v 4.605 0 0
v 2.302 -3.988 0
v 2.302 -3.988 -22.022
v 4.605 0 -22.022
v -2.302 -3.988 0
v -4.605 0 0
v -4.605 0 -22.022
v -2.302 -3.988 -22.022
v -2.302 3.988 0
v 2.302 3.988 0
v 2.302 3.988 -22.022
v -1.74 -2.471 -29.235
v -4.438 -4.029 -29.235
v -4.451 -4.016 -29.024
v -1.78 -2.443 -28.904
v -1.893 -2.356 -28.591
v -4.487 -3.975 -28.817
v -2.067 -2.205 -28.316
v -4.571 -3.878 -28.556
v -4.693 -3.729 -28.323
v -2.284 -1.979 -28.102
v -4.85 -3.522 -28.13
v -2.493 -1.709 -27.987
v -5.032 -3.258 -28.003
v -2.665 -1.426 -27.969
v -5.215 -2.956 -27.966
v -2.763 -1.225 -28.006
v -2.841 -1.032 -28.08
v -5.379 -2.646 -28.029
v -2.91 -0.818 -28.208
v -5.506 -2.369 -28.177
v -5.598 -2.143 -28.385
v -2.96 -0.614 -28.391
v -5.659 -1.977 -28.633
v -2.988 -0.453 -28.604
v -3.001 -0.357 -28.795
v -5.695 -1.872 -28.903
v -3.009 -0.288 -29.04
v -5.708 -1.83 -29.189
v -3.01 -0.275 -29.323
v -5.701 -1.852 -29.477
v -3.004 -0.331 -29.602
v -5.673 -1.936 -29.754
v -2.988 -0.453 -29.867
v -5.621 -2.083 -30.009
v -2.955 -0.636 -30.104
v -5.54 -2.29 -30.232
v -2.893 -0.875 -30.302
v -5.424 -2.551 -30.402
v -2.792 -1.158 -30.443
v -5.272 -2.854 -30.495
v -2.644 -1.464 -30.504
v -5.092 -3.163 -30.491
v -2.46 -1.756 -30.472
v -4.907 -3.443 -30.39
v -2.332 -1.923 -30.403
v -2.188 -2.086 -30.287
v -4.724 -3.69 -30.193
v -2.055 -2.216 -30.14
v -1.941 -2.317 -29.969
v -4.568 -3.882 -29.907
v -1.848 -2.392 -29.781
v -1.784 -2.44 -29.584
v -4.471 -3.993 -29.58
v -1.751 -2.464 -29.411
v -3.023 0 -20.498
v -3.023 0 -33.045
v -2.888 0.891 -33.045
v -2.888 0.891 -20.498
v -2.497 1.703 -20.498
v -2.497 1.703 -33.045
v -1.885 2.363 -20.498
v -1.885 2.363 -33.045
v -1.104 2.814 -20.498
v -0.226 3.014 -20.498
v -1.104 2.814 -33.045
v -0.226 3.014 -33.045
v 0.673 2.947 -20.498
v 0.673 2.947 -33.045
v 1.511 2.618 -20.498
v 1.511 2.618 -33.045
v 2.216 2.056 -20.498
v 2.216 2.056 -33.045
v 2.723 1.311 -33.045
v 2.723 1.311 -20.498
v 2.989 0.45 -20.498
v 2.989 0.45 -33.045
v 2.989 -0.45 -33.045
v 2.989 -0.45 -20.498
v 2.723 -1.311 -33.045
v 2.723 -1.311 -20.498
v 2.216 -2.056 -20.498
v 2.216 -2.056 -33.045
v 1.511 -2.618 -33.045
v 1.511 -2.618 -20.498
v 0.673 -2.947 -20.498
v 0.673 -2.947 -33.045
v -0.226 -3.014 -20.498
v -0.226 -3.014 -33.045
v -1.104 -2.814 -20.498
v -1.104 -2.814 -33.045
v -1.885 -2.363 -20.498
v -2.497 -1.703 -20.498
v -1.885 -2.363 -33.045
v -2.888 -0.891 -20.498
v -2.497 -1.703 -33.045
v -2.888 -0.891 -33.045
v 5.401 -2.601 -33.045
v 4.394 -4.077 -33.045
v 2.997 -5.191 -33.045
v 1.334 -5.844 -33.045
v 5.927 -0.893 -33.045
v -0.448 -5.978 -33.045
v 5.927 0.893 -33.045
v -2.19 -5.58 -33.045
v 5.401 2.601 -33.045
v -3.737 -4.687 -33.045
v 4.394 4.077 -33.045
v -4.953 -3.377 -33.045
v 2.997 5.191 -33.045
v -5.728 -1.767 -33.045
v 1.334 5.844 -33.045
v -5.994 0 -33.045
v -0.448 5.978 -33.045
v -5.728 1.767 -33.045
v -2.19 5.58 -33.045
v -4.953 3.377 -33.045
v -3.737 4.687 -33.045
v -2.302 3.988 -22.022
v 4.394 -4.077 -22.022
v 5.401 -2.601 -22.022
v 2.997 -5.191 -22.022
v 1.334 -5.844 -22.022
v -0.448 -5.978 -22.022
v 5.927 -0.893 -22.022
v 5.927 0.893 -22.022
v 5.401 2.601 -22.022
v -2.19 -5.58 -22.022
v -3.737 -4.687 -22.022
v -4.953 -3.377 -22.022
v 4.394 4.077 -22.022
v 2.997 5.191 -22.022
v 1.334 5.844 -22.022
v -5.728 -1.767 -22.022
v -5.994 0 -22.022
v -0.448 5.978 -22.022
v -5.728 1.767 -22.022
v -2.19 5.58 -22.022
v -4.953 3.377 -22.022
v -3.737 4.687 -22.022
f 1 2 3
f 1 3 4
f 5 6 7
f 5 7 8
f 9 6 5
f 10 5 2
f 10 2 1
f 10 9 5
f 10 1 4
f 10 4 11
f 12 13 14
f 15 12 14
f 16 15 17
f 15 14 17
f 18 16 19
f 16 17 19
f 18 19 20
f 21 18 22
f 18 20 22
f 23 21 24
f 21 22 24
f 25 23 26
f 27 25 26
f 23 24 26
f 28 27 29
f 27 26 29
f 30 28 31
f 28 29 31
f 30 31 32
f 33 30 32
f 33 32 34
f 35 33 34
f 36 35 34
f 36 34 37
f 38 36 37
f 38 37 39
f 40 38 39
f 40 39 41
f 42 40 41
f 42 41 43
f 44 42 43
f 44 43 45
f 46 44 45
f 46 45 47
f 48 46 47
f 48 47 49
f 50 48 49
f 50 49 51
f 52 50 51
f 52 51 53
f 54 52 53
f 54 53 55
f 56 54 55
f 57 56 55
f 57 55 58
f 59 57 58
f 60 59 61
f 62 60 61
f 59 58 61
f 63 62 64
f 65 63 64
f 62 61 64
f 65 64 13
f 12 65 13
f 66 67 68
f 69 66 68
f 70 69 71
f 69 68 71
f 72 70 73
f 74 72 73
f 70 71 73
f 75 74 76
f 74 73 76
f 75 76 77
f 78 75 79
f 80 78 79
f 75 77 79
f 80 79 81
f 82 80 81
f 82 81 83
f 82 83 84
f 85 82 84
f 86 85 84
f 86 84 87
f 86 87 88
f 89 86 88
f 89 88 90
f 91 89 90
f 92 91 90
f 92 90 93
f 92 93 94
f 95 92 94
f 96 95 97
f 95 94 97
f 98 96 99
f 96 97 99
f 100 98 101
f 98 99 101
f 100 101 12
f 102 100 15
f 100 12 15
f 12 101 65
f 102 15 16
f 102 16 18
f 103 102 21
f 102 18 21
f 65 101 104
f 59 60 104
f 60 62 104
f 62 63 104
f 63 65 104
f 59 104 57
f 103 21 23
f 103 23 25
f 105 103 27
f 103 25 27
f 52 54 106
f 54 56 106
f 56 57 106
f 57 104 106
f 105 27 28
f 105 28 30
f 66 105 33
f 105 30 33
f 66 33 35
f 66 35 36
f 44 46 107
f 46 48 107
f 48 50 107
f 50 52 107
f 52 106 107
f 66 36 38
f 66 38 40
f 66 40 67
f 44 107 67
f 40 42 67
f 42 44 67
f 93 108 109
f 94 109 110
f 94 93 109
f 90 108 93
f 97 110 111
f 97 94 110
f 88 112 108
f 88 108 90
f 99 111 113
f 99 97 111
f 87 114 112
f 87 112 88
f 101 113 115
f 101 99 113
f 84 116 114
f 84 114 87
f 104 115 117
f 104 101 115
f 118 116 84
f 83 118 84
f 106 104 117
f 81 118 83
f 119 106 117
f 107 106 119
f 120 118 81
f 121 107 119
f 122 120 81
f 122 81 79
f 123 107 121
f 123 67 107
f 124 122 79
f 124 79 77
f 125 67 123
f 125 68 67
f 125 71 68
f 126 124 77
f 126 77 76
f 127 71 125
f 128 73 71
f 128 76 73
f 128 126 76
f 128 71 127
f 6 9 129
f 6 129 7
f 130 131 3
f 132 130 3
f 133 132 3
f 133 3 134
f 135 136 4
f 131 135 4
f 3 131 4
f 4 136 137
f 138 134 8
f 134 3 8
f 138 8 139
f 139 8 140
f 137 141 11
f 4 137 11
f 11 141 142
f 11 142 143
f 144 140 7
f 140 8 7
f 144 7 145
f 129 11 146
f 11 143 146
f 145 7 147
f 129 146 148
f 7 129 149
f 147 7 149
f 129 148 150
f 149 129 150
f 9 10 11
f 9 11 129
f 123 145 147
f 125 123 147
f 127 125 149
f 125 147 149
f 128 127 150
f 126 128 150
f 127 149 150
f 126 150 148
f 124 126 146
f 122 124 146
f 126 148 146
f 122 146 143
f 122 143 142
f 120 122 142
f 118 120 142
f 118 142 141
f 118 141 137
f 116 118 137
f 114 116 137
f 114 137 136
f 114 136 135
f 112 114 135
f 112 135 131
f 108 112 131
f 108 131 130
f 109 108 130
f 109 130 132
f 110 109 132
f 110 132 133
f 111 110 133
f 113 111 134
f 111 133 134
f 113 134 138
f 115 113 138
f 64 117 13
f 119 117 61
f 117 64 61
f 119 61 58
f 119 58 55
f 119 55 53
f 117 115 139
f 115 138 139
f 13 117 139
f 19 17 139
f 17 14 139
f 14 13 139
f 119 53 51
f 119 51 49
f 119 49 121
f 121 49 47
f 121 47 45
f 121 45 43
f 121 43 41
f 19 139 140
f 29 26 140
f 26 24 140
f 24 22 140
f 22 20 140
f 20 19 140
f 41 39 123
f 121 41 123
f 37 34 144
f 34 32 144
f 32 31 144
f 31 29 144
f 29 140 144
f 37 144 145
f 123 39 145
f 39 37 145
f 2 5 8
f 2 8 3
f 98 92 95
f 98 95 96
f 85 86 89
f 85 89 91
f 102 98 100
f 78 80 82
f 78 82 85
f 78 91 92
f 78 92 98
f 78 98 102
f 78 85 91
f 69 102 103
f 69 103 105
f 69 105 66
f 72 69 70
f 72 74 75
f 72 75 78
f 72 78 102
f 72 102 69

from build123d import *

# Parameters (mm, degrees)
BOSS_EXTRUDE1_DEPTH = 22.0218
SKETCH3_R           = 5.9944
BOSS_EXTRUDE2_DEPTH = 11.0236
SKETCH4_R           = 3.0226
CUT_EXTRUDE1_DEPTH  = 12.5476
SKETCH5_R           = 1.27
CUT_EXTRUDE2_DEPTH  = 6.35


with BuildPart() as part:
    # Sketch1 → Boss-Extrude1 (new body)
    with BuildSketch(Plane.XY):
        Polygon((2.302357403, 3.9878), (-2.302357403, 3.9878), (-4.604714807, 0), (-2.302357403, -3.9878), (2.302357403, -3.9878), (4.604714807, 0), align=None)
    extrude(amount=-BOSS_EXTRUDE1_DEPTH)

    # Sketch3 → Boss-Extrude2 (add)
    with BuildSketch(Plane(origin=(0, 0, -22.0218), x_dir=(-1, 0, 0), z_dir=(0, 0, -1))):
        Circle(SKETCH3_R)
    extrude(amount=BOSS_EXTRUDE2_DEPTH)

    # Sketch4 → Cut-Extrude1 (cut)
    with BuildSketch(Plane(origin=(0, 0, -33.0454), x_dir=(-1, 0, 0), z_dir=(0, 0, -1))):
        Circle(SKETCH4_R)
    extrude(amount=-CUT_EXTRUDE1_DEPTH, mode=Mode.SUBTRACT)

    # Sketch5 → Cut-Extrude2 (cut)
    with BuildSketch(Plane(origin=(-5.19130268, -2.9972, 0), x_dir=(0, 0, 1), z_dir=(-0.8660254037844376, -0.500000000000002, 0))):
        with Locations(Location((-29.2354, 0, 0), (0, 0, 270))):
            Circle(SKETCH5_R)
    extrude(amount=-CUT_EXTRUDE2_DEPTH, mode=Mode.SUBTRACT)


solid = part.part
